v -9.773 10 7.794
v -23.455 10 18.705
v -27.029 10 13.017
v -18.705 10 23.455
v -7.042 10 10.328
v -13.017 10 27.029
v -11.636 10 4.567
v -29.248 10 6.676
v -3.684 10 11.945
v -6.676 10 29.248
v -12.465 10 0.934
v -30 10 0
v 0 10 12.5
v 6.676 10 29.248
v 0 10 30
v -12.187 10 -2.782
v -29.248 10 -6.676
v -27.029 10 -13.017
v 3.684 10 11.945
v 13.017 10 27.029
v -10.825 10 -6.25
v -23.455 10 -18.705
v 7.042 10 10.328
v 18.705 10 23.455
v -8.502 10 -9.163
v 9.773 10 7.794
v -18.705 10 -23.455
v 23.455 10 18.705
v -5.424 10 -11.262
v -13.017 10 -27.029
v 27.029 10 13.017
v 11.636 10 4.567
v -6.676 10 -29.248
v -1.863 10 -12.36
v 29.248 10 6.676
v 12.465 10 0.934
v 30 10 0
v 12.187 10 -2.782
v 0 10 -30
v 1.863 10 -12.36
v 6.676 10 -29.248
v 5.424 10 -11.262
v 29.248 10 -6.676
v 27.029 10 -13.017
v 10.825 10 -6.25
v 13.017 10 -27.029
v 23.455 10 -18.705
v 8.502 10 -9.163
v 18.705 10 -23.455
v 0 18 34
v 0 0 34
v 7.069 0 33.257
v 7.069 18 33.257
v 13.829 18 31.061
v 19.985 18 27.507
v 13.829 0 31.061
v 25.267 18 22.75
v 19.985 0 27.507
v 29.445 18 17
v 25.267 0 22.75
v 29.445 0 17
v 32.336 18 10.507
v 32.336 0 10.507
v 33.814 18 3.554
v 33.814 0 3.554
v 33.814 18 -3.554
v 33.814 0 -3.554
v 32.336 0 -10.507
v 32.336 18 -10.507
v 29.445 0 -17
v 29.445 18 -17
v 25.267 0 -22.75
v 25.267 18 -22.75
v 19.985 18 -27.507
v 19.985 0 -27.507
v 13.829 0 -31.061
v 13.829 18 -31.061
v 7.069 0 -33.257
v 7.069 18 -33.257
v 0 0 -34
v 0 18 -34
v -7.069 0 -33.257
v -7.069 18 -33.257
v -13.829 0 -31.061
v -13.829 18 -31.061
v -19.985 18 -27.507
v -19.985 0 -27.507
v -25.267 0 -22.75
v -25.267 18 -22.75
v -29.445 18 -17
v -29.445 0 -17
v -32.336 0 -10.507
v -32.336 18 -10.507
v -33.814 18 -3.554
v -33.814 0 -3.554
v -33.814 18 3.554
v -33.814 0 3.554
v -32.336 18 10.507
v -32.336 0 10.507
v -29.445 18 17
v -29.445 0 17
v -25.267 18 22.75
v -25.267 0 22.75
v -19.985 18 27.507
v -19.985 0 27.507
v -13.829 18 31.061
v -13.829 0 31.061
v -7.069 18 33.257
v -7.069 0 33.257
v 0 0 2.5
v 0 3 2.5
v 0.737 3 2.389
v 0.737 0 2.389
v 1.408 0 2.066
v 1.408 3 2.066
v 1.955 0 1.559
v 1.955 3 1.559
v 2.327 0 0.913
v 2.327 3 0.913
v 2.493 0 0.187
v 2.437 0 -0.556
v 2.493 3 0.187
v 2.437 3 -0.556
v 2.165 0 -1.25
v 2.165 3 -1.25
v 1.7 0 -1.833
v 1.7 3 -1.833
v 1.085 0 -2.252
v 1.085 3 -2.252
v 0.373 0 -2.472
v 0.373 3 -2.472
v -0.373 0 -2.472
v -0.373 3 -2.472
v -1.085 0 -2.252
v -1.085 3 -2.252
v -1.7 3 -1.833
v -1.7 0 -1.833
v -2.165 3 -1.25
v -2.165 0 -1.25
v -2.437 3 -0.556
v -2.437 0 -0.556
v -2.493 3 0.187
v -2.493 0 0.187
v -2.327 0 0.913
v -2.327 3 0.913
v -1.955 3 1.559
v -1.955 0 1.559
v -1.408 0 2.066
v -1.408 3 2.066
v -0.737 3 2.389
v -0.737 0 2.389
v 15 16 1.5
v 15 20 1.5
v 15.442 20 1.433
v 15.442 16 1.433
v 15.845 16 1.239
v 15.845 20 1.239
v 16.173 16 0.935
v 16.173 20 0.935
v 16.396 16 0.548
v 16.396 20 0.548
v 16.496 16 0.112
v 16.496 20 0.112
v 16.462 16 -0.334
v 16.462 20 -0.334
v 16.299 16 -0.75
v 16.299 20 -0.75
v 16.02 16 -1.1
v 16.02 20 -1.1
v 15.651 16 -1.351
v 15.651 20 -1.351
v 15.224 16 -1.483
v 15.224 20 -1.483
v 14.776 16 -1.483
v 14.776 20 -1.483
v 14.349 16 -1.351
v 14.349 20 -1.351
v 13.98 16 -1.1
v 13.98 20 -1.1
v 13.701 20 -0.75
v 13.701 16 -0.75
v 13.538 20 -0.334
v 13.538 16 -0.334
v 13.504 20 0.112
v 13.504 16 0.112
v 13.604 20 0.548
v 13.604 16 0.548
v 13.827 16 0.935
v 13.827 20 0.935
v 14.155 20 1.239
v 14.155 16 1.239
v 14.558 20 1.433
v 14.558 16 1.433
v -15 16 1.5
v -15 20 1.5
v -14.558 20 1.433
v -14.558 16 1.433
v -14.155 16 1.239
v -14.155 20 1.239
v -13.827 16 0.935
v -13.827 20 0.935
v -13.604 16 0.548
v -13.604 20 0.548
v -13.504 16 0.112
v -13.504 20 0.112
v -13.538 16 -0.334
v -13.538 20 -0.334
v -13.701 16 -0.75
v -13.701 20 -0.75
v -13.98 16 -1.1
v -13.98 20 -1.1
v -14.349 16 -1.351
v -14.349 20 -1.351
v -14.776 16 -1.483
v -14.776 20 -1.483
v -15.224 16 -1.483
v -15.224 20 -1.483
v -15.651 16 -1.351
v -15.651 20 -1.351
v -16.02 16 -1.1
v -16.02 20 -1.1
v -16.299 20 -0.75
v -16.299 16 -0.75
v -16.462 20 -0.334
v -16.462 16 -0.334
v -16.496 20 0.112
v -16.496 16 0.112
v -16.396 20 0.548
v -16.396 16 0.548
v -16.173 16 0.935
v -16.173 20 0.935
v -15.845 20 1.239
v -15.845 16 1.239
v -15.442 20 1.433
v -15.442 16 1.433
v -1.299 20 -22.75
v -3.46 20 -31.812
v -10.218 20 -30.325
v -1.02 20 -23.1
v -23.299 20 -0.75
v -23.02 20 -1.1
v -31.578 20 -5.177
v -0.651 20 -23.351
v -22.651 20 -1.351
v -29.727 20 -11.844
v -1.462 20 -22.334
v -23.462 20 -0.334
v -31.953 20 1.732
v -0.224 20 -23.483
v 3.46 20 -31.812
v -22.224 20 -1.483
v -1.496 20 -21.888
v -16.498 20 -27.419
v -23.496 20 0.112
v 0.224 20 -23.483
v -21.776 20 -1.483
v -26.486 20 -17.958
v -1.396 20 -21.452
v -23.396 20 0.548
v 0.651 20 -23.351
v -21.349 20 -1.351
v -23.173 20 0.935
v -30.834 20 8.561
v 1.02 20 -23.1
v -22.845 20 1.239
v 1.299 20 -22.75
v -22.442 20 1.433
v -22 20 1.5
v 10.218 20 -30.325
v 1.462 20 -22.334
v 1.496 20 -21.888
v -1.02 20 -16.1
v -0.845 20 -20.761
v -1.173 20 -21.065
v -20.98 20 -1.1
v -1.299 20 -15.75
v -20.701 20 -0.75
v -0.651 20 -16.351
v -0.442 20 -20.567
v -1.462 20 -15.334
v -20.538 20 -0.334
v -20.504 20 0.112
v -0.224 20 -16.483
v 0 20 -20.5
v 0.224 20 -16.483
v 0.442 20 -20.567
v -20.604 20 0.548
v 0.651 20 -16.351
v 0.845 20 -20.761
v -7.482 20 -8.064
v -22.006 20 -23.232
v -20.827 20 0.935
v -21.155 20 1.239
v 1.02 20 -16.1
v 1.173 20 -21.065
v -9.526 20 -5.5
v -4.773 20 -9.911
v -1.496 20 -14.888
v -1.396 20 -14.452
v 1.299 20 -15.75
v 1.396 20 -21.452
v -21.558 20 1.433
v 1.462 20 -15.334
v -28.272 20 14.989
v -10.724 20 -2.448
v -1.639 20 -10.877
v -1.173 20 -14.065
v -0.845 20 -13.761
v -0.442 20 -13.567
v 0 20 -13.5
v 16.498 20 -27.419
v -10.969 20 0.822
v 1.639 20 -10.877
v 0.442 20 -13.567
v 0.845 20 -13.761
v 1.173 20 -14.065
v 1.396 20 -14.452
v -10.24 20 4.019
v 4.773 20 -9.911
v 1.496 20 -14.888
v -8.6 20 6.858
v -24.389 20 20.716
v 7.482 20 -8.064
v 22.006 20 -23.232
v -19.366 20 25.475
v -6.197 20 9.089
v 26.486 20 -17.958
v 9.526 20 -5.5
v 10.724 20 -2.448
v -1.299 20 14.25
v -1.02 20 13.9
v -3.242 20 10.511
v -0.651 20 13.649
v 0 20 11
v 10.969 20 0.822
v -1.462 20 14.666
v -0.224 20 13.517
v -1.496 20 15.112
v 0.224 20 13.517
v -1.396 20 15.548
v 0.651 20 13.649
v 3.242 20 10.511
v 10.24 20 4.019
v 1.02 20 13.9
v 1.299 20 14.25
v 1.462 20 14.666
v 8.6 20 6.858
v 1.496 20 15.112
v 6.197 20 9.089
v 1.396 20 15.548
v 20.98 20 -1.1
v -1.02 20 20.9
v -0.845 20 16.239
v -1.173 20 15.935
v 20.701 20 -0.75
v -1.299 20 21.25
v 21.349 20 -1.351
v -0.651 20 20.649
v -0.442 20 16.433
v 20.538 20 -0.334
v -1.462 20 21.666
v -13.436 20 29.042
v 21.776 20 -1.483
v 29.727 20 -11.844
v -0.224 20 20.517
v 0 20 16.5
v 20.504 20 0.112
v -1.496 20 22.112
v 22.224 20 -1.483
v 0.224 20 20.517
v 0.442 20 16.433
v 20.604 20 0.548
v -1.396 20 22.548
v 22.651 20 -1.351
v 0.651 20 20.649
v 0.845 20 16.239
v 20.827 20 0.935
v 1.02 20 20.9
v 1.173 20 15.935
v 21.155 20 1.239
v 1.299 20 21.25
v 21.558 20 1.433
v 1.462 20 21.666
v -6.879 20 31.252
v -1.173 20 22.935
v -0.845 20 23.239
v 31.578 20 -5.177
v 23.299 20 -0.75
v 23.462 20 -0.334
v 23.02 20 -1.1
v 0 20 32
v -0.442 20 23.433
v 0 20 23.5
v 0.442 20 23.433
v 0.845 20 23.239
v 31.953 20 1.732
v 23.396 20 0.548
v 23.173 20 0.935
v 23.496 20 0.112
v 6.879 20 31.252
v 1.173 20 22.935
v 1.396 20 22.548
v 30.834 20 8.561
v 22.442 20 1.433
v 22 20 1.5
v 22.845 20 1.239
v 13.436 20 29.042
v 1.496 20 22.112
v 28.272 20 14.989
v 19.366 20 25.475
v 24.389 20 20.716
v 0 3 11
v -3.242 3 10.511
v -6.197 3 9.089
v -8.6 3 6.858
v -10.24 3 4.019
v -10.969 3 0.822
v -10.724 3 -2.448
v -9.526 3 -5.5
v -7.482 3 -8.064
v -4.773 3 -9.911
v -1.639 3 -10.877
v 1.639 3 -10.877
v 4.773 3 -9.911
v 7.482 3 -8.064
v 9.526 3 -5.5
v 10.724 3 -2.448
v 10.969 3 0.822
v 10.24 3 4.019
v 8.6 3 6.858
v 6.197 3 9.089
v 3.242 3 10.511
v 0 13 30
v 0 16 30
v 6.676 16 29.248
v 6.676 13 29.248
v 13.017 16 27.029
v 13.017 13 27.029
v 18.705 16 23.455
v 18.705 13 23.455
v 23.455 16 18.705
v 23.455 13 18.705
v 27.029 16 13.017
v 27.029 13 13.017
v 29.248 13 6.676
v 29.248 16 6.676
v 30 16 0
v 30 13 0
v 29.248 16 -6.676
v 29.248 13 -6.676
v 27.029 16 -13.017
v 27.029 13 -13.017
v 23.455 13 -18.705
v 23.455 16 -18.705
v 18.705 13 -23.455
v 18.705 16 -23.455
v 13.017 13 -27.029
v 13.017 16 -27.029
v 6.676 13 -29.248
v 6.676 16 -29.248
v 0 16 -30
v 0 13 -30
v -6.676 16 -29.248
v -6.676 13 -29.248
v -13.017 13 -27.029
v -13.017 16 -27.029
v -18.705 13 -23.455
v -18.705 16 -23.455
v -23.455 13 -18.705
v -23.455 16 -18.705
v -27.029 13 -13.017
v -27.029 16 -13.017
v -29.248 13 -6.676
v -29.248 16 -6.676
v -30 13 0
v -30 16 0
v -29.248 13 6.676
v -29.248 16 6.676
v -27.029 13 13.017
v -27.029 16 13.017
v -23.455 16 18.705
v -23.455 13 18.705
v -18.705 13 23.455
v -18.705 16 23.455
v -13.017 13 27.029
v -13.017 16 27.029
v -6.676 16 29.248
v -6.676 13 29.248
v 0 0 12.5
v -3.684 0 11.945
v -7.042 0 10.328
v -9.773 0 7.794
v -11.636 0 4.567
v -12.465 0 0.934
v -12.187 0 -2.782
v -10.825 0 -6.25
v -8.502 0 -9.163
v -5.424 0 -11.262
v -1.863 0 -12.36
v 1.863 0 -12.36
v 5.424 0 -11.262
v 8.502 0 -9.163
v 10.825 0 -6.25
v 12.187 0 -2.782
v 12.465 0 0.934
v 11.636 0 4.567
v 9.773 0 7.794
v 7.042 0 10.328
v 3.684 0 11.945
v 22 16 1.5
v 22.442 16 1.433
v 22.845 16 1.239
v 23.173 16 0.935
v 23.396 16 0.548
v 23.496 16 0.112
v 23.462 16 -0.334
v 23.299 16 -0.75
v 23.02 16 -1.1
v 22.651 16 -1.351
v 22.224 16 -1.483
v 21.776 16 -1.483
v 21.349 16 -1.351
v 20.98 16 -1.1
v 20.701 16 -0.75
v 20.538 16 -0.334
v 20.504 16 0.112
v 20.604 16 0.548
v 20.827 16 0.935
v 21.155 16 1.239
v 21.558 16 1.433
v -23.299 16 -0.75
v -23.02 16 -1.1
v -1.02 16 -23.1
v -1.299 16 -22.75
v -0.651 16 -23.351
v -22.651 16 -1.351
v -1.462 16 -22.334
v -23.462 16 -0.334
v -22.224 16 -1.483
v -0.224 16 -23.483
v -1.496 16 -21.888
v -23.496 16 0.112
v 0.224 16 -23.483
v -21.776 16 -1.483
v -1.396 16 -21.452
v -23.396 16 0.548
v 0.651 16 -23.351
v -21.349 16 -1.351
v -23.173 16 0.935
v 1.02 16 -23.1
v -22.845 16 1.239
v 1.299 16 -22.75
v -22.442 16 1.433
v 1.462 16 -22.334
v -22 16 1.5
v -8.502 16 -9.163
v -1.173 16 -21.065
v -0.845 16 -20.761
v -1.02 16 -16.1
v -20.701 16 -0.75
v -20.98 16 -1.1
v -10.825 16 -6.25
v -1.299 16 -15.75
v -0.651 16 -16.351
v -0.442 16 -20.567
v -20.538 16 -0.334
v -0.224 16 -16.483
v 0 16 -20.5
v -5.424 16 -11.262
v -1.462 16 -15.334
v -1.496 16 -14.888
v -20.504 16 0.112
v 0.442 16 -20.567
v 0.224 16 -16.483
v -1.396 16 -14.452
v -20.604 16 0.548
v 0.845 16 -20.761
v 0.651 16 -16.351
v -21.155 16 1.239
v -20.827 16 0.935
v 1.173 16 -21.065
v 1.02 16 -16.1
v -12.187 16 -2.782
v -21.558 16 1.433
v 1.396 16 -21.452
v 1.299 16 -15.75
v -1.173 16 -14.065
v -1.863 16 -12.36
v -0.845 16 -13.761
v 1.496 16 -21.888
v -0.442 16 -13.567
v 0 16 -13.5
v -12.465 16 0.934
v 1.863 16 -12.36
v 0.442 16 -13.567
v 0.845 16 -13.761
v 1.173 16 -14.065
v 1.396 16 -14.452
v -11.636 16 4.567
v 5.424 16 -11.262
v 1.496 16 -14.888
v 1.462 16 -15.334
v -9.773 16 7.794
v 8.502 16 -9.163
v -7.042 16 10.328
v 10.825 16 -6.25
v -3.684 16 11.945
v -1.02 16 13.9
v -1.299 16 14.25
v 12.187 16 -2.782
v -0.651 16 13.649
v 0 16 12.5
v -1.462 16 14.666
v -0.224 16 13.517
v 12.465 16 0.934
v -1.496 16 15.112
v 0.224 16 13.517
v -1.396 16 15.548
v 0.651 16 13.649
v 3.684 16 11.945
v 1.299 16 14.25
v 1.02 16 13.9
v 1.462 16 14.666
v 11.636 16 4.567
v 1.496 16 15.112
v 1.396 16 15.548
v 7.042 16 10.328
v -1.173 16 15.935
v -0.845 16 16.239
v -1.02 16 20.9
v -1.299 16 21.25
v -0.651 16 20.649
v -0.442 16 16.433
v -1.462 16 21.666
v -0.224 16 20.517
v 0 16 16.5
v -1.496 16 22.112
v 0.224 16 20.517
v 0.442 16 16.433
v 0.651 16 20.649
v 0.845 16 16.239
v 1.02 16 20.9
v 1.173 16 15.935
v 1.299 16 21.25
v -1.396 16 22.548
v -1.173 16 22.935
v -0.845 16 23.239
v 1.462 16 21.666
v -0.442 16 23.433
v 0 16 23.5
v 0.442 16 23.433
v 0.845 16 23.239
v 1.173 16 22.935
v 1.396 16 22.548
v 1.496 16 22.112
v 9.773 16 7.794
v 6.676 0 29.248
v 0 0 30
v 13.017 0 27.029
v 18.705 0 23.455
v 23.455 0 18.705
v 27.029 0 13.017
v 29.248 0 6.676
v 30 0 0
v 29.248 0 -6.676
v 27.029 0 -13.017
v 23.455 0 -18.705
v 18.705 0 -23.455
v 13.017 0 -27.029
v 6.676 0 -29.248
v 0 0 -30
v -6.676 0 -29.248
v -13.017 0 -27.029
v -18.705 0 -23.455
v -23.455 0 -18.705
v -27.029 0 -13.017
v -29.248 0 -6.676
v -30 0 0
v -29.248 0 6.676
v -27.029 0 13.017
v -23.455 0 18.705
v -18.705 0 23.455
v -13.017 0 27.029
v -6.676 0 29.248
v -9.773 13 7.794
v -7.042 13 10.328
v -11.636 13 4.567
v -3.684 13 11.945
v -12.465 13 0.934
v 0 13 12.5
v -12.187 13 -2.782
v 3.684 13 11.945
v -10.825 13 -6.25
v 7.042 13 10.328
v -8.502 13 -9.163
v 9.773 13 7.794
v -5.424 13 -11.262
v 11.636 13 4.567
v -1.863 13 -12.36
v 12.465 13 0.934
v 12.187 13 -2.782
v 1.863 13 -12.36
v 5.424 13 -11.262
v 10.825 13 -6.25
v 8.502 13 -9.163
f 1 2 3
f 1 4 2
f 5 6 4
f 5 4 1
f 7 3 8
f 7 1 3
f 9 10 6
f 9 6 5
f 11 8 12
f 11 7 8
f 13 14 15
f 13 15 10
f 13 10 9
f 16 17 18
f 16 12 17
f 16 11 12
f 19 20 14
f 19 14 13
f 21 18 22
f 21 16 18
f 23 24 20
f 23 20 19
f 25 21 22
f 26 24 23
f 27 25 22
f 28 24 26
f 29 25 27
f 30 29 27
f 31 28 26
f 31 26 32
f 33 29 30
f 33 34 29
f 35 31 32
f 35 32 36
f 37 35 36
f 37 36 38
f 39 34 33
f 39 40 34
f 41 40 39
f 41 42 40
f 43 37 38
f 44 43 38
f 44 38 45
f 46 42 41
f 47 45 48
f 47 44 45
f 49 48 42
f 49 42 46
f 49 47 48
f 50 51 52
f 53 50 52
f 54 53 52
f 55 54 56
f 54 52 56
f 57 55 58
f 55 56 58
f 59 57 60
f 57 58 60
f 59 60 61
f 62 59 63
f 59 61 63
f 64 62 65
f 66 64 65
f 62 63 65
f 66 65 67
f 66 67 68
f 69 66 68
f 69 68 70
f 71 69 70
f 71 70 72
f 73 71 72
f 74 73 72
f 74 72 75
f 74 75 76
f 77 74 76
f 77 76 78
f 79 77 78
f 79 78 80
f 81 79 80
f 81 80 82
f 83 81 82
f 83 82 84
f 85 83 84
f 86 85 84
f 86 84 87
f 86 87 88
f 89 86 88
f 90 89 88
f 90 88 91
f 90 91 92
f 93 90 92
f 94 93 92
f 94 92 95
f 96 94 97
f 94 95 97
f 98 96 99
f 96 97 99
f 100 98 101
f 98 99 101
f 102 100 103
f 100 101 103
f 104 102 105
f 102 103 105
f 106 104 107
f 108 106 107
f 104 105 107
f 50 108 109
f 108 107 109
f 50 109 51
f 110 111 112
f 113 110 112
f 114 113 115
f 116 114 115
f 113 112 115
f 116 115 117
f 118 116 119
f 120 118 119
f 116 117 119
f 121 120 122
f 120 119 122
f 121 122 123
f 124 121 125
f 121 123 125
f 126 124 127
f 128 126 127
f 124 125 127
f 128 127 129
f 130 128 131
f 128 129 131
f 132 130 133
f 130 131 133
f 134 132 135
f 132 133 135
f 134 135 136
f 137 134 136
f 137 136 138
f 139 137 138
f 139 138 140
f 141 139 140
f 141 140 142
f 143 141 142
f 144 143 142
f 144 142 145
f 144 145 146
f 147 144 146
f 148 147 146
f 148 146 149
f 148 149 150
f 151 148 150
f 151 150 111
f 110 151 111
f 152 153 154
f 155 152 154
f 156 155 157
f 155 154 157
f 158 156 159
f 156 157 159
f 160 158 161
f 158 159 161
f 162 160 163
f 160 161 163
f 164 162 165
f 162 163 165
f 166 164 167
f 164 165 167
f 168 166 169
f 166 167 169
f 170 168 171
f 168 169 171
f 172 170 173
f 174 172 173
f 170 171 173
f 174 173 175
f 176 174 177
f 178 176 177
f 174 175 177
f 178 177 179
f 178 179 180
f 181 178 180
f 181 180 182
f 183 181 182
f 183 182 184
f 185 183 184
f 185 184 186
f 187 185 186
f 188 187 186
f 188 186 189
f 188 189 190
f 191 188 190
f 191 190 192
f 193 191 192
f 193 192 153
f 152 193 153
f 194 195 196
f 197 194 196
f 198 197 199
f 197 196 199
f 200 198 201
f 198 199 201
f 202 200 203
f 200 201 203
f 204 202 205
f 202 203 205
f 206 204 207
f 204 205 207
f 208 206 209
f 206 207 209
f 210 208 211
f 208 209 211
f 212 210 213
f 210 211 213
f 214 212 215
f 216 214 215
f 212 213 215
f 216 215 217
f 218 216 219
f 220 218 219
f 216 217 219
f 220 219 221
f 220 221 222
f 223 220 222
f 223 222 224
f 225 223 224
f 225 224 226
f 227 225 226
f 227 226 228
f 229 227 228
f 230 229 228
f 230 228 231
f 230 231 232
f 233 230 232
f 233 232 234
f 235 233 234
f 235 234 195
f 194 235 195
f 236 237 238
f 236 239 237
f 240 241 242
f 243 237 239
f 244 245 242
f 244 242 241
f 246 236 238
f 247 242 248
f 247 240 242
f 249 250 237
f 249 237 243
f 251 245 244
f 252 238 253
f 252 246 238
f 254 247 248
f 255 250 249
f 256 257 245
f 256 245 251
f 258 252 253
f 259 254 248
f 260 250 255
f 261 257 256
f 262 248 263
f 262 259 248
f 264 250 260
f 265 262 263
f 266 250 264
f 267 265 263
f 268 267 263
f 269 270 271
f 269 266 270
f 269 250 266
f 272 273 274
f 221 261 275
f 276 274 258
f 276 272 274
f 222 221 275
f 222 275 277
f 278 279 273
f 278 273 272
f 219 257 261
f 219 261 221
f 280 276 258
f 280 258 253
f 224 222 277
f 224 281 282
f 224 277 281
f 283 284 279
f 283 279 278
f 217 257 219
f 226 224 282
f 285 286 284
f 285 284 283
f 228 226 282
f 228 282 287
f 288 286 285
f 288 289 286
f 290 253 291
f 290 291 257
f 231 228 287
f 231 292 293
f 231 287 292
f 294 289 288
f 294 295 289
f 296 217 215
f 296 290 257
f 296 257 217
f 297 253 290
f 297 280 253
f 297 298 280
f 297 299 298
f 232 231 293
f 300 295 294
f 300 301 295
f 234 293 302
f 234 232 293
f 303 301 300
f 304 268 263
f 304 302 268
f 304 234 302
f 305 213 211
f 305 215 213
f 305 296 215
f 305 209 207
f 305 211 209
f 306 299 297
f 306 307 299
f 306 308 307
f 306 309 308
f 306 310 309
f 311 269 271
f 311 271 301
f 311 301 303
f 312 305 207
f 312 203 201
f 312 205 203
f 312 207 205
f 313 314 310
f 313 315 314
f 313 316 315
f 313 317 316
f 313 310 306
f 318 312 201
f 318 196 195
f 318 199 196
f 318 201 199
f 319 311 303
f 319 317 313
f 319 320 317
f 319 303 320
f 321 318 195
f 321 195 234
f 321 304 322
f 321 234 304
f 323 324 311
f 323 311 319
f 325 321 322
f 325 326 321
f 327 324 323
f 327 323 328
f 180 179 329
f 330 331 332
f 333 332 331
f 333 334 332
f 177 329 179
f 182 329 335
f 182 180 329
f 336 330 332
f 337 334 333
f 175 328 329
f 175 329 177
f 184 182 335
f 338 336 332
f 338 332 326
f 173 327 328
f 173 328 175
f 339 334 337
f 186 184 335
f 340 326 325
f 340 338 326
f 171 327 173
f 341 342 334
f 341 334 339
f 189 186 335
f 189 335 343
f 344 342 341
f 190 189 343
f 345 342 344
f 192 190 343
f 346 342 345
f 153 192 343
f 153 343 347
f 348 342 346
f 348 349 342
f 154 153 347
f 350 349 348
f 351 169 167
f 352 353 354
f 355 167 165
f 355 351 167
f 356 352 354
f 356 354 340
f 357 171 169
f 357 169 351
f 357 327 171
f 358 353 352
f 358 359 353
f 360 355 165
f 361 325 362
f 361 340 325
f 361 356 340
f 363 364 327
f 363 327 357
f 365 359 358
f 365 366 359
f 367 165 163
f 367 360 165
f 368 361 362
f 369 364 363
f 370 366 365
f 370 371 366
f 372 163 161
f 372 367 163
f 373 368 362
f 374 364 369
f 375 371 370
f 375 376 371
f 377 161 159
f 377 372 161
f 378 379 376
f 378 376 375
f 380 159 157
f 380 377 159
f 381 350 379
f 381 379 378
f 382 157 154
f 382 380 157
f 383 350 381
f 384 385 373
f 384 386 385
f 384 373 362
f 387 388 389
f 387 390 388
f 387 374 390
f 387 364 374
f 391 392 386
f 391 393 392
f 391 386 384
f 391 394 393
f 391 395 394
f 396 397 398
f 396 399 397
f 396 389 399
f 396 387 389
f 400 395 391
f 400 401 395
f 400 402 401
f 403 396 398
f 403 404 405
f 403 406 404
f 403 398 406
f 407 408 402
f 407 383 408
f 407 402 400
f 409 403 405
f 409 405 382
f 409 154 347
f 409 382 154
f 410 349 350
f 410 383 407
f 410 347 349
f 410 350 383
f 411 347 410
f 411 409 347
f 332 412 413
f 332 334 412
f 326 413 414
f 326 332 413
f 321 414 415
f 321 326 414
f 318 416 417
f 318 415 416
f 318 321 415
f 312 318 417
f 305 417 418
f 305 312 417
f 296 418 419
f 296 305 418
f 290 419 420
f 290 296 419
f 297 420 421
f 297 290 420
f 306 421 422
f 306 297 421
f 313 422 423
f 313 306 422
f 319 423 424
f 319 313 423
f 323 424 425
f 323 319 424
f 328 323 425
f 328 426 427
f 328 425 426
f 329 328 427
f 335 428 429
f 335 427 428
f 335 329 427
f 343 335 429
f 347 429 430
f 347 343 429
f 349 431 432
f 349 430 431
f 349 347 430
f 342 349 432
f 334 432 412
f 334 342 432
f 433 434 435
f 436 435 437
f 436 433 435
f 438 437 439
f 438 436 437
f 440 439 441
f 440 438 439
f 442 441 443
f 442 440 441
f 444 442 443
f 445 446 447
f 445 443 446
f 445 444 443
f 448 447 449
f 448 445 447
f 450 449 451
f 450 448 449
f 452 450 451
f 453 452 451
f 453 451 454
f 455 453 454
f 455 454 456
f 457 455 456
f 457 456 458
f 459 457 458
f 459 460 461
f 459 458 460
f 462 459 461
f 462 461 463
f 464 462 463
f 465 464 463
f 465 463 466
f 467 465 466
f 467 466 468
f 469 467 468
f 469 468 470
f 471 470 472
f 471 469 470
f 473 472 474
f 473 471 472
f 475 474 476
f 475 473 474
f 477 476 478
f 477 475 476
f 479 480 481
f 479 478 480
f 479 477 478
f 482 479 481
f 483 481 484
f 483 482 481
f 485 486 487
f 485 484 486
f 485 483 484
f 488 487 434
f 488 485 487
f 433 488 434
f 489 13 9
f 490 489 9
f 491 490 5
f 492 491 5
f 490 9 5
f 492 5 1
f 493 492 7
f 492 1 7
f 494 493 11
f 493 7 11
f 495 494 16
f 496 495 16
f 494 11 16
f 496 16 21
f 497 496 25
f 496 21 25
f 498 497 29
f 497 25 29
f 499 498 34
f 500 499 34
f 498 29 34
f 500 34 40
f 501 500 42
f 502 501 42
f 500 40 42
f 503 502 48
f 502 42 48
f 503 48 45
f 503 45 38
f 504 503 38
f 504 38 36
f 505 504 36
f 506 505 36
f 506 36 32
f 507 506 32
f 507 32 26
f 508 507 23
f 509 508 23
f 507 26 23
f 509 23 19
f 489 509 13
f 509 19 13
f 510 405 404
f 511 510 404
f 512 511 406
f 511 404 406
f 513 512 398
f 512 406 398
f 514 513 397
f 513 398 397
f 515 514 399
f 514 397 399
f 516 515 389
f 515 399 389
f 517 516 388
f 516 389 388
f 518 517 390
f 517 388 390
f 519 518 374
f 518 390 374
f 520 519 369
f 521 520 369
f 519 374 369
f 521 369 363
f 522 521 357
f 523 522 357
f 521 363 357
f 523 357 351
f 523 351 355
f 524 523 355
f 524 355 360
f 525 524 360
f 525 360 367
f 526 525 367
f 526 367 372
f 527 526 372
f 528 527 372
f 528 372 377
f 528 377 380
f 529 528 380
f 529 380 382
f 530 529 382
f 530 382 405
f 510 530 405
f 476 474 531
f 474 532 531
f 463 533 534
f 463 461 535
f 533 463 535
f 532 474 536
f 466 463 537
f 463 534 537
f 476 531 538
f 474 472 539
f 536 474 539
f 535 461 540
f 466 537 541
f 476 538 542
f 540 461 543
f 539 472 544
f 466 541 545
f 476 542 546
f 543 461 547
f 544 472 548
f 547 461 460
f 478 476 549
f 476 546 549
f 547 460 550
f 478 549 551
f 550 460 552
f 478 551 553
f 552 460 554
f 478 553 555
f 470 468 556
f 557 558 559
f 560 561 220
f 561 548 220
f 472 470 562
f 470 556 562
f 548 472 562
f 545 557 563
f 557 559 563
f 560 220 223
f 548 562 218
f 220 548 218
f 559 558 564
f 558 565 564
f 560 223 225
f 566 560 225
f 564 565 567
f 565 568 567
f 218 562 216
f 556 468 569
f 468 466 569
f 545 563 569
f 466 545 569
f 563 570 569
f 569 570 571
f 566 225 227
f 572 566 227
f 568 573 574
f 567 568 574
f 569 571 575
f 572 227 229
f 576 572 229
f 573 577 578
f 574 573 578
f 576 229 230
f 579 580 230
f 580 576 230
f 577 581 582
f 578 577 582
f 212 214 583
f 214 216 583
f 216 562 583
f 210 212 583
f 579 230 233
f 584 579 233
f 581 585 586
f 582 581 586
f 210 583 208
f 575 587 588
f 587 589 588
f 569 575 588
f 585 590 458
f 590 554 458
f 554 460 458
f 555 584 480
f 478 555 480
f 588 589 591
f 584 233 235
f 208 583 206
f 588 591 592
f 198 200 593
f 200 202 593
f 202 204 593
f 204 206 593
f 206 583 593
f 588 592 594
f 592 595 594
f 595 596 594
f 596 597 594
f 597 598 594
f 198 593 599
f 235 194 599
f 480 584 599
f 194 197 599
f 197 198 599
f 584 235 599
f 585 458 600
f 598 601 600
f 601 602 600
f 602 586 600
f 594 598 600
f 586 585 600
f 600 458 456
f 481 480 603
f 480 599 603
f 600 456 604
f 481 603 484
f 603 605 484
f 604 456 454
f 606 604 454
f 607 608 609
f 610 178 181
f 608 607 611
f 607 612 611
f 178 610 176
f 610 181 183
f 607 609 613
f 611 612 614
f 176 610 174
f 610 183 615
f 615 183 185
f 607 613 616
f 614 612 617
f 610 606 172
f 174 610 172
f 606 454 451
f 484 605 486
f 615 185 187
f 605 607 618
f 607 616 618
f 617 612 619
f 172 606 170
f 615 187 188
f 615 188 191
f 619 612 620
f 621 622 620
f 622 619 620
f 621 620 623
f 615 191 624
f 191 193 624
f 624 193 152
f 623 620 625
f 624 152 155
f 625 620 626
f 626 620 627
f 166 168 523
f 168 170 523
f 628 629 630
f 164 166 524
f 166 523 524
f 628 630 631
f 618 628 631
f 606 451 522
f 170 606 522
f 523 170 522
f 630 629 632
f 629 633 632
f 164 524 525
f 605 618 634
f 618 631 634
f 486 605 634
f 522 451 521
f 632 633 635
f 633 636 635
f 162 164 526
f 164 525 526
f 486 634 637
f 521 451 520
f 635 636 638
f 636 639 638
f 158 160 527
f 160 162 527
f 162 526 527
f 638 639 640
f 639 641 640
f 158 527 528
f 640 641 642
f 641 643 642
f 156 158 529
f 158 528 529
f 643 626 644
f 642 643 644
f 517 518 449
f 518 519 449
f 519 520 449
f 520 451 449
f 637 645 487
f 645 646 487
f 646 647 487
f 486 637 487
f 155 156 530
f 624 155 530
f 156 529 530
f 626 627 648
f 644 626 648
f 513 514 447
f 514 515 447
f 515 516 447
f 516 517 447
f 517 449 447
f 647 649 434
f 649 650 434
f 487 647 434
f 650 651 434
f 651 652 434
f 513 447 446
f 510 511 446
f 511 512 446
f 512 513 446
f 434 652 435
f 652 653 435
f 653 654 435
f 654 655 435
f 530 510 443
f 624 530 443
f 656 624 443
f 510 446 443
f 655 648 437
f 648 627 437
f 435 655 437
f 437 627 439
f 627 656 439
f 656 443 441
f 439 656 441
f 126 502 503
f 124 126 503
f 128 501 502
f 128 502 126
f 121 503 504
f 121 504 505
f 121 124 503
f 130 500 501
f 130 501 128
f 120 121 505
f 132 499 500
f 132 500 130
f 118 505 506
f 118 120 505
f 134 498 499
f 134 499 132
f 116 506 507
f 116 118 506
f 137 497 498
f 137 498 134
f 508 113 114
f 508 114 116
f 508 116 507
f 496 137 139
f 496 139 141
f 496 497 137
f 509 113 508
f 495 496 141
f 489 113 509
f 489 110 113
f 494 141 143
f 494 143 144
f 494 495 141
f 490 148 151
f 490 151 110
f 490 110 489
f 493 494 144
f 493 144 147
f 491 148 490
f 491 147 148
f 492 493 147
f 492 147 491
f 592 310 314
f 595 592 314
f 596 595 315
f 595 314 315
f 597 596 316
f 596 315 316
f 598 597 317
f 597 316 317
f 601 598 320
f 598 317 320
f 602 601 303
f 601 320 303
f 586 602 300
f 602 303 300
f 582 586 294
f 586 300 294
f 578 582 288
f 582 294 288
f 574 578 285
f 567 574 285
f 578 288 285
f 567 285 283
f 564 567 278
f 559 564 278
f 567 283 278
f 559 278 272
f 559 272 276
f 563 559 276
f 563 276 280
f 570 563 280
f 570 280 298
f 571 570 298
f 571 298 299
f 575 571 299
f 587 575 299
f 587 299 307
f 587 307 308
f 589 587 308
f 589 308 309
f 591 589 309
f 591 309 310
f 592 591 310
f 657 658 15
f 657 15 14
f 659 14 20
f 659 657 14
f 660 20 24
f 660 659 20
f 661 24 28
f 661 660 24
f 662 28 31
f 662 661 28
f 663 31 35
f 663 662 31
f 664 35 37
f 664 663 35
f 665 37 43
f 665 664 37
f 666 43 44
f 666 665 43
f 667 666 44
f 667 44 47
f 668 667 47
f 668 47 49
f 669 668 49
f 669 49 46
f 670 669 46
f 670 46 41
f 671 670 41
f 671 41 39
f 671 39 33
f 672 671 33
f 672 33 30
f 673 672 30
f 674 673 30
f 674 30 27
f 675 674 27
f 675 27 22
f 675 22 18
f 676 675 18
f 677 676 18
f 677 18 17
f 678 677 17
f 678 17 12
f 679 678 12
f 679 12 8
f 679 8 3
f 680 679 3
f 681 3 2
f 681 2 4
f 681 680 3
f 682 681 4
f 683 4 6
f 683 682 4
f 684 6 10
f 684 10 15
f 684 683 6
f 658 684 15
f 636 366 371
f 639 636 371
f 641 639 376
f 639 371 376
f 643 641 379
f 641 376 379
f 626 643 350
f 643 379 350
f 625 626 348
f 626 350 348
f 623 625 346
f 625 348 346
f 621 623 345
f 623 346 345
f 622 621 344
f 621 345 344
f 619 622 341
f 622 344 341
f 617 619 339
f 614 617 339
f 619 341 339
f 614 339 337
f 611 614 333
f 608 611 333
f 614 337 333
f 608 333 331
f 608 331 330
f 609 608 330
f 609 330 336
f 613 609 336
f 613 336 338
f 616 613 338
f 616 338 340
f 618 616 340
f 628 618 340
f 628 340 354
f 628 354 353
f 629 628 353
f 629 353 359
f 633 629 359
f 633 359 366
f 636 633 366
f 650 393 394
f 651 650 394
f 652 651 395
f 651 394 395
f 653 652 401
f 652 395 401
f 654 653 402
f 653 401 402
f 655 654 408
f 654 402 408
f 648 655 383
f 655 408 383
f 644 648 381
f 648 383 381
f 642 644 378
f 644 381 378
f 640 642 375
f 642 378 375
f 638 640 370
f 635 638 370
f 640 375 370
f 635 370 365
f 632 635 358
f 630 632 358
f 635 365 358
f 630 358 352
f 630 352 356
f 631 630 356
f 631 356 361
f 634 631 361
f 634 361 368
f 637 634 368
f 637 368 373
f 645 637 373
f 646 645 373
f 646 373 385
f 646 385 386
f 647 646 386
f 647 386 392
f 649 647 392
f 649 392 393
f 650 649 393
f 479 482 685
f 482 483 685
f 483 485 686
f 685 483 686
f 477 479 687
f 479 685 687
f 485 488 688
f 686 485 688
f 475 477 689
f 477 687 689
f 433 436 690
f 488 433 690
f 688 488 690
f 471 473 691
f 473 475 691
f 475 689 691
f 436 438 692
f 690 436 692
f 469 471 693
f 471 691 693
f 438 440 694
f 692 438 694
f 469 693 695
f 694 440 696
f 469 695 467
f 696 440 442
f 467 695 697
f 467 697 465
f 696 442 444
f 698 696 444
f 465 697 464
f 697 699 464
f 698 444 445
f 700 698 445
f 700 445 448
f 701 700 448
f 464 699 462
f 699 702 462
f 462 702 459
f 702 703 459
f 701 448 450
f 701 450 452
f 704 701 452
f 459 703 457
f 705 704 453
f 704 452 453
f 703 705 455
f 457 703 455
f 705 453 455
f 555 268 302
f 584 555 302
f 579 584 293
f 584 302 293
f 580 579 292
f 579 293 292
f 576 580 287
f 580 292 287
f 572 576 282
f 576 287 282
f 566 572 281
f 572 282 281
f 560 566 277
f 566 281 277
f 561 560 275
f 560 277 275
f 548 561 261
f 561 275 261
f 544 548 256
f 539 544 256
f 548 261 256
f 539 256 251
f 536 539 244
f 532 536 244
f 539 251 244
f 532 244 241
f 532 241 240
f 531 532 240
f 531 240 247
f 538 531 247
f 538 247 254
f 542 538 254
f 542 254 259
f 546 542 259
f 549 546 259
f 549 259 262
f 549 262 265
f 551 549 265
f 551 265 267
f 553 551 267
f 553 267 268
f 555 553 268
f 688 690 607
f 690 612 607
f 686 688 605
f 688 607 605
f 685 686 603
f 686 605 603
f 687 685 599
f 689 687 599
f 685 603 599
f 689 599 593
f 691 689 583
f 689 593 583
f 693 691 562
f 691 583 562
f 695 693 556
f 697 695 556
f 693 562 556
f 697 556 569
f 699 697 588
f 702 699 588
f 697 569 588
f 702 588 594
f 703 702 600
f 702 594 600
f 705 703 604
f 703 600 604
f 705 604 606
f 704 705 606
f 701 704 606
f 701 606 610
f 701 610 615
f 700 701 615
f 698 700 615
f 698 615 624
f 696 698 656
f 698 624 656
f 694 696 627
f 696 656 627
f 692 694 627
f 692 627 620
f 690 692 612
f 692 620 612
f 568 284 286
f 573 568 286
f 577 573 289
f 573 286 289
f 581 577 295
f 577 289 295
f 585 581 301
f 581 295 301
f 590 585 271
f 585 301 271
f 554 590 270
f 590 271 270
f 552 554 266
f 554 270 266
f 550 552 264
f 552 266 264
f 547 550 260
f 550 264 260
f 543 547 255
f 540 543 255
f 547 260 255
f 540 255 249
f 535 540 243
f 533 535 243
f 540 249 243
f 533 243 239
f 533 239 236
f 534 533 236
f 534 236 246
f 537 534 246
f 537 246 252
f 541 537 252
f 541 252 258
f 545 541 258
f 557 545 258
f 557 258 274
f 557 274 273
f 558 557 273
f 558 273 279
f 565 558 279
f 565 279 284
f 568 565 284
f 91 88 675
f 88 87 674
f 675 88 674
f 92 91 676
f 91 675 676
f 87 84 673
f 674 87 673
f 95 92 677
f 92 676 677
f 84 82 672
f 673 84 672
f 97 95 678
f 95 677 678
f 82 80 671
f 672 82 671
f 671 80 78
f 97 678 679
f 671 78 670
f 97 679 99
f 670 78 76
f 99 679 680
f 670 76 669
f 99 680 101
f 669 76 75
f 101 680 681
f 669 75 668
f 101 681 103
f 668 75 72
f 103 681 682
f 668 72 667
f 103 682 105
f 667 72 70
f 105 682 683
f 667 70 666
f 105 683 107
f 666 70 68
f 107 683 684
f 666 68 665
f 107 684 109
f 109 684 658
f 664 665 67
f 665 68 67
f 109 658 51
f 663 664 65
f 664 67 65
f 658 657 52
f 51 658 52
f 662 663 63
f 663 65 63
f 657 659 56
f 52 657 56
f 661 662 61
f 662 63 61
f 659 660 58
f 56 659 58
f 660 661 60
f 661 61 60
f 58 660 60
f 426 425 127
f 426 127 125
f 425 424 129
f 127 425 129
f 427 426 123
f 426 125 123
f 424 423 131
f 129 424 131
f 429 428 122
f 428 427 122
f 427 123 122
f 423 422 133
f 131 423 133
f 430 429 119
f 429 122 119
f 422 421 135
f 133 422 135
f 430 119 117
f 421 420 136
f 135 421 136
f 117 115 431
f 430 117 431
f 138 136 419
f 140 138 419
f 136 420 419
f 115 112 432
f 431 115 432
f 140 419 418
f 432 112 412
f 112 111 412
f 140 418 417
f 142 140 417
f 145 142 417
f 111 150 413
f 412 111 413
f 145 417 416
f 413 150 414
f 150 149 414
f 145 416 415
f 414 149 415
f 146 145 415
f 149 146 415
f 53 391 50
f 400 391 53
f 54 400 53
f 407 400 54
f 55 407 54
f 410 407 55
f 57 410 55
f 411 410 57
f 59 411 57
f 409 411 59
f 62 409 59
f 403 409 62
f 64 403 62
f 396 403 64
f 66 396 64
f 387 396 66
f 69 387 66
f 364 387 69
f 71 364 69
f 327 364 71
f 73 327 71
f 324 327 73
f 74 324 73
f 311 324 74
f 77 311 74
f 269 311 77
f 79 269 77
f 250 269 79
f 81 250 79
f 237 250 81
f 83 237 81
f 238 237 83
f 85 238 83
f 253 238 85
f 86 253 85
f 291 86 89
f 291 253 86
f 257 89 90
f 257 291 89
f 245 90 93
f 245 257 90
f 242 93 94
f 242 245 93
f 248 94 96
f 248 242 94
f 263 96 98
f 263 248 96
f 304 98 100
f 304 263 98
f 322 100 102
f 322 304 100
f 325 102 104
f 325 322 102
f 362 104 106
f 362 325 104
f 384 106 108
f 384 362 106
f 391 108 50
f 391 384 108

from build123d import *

# Parameters (mm, degrees)
SKETCH_1_R          = 34
SKETCH_1_R_2        = 30
EXTRUDE_1_DEPTH     = 20
EXTRUDE_START       = 20
SKETCH_1_2_R        = 34
SKETCH_1_2_R_2      = 30
EXTRUDE_2_DEPTH     = 4
SKETCH_2_R          = 11
SKETCH_2_R_2        = 1.5
CUT_EXTRUDE_1_DEPTH = 53.076866265
CHAMFER_1_SIZE      = 2
SKETCH_3_R          = 12.5
SKETCH_3_R_2        = 11
EXTRUDE_3_DEPTH     = 16
EXTRUDE_START_2     = 16
SKETCH_3_2_R        = 12.5
SKETCH_3_2_R_2      = 11
EXTRUDE_4_DEPTH     = 3
SKETCH_5_R          = 2.5
CUT_EXTRUDE_2_DEPTH = 52
EXTRUDE_START_3     = 3
SKETCH_6_R          = 30
SKETCH_6_R_2        = 12.5
EXTRUDE_5_DEPTH     = 3


with BuildPart() as part:
    # 草图1 → 凸台-拉伸1 (new body)
    with BuildSketch(Plane(origin=(0, 0, 0), x_dir=(1, 0, 0), z_dir=(0, 1, 0))):
        with Locations(Location((0, 0, 0), (0, 0, 270))):
            Circle(SKETCH_1_R)
        with Locations(Location((0, 0, 0), (0, 0, 270))):
            Circle(SKETCH_1_R_2, mode=Mode.SUBTRACT)
    extrude(amount=EXTRUDE_1_DEPTH)

    # 草图1<2> → 凸台-拉伸2 (add)
    with BuildSketch(Plane(origin=(0, 0, 0), x_dir=(1, 0, 0), z_dir=(0, 1, 0)).offset(EXTRUDE_START)):
        with Locations(Location((0, 0, 0), (0, 0, 270))):
            Circle(SKETCH_1_2_R)
        with Locations(Location((0, 0, 0), (0, 0, 270))):
            Circle(SKETCH_1_2_R_2, mode=Mode.SUBTRACT)
        with Locations(Location((0, 0, 0), (0, 0, 270))):
            Circle(SKETCH_1_2_R_2)
    extrude(amount=-EXTRUDE_2_DEPTH)

    # 草图2 → 切除-拉伸1 (cut, through all)
    with BuildSketch(Plane(origin=(0, 20, 0), x_dir=(1, 0, 0), z_dir=(0, 1, 0))):
        with Locations(Location((0, 0, 0), (0, 0, 270))):
            Circle(SKETCH_2_R)
        with Locations(Location((0, 15, 0), (0, 0, 270))):
            Circle(SKETCH_2_R_2)
        with Locations(Location((0, 22, 0), (0, 0, 270))):
            Circle(SKETCH_2_R_2)
        with Locations(Location((15, 0, 0), (0, 0, 270))):
            Circle(SKETCH_2_R_2)
        with Locations(Location((22, 0, 0), (0, 0, 270))):
            Circle(SKETCH_2_R_2)
        with Locations(Location((0, -15, 0), (0, 0, 270))):
            Circle(SKETCH_2_R_2)
        with Locations(Location((0, -22, 0), (0, 0, 270))):
            Circle(SKETCH_2_R_2)
        with Locations(Location((-15, 0, 0), (0, 0, 270))):
            Circle(SKETCH_2_R_2)
        with Locations(Location((-22, 0, 0), (0, 0, 270))):
            Circle(SKETCH_2_R_2)
    extrude(amount=-CUT_EXTRUDE_1_DEPTH, mode=Mode.SUBTRACT)

    # 倒角1
    chamfer_1_edges = [part.edges().sort_by_distance(p)[0] for p in [
        (0, 20, -34),
    ]]
    chamfer(chamfer_1_edges, length=CHAMFER_1_SIZE)

    # 草图3 → 凸台-拉伸3 (add)
    with BuildSketch(Plane.XZ.offset(-16)):
        with Locations(Location((0, 0, 0), (0, 0, 90))):
            Circle(SKETCH_3_R)
        with Locations(Location((0, 0, 0), (0, 0, 90))):
            Circle(SKETCH_3_R_2, mode=Mode.SUBTRACT)
    extrude(amount=EXTRUDE_3_DEPTH)

    # 草图3<2> → 凸台-拉伸4 (add)
    with BuildSketch(Plane.XZ.offset(-16).offset(EXTRUDE_START_2)):
        with Locations(Location((0, 0, 0), (0, 0, 90))):
            Circle(SKETCH_3_2_R)
        with Locations(Location((0, 0, 0), (0, 0, 90))):
            Circle(SKETCH_3_2_R_2, mode=Mode.SUBTRACT)
        with Locations(Location((0, 0, 0), (0, 0, 90))):
            Circle(SKETCH_3_2_R_2)
    extrude(amount=-EXTRUDE_4_DEPTH)

    # 草图5 → 切除-拉伸2 (cut, through all)
    with BuildSketch(Plane(origin=(0, 3, 0), x_dir=(1, 0, 0), z_dir=(0, 1, 0))):
        with Locations(Location((0, 0, 0), (0, 0, 270))):
            Circle(SKETCH_5_R)
    extrude(amount=-CUT_EXTRUDE_2_DEPTH, mode=Mode.SUBTRACT)

    # 草图6 → 凸台-拉伸5 (add)
    with BuildSketch(Plane.XZ.offset(-16).offset(EXTRUDE_START_3)):
        with Locations(Location((0, 0, 0), (0, 0, 270))):
            Circle(SKETCH_6_R)
        with Locations(Location((0, 0, 0), (0, 0, 90))):
            Circle(SKETCH_6_R_2, mode=Mode.SUBTRACT)
    extrude(amount=EXTRUDE_5_DEPTH)


solid = part.part
